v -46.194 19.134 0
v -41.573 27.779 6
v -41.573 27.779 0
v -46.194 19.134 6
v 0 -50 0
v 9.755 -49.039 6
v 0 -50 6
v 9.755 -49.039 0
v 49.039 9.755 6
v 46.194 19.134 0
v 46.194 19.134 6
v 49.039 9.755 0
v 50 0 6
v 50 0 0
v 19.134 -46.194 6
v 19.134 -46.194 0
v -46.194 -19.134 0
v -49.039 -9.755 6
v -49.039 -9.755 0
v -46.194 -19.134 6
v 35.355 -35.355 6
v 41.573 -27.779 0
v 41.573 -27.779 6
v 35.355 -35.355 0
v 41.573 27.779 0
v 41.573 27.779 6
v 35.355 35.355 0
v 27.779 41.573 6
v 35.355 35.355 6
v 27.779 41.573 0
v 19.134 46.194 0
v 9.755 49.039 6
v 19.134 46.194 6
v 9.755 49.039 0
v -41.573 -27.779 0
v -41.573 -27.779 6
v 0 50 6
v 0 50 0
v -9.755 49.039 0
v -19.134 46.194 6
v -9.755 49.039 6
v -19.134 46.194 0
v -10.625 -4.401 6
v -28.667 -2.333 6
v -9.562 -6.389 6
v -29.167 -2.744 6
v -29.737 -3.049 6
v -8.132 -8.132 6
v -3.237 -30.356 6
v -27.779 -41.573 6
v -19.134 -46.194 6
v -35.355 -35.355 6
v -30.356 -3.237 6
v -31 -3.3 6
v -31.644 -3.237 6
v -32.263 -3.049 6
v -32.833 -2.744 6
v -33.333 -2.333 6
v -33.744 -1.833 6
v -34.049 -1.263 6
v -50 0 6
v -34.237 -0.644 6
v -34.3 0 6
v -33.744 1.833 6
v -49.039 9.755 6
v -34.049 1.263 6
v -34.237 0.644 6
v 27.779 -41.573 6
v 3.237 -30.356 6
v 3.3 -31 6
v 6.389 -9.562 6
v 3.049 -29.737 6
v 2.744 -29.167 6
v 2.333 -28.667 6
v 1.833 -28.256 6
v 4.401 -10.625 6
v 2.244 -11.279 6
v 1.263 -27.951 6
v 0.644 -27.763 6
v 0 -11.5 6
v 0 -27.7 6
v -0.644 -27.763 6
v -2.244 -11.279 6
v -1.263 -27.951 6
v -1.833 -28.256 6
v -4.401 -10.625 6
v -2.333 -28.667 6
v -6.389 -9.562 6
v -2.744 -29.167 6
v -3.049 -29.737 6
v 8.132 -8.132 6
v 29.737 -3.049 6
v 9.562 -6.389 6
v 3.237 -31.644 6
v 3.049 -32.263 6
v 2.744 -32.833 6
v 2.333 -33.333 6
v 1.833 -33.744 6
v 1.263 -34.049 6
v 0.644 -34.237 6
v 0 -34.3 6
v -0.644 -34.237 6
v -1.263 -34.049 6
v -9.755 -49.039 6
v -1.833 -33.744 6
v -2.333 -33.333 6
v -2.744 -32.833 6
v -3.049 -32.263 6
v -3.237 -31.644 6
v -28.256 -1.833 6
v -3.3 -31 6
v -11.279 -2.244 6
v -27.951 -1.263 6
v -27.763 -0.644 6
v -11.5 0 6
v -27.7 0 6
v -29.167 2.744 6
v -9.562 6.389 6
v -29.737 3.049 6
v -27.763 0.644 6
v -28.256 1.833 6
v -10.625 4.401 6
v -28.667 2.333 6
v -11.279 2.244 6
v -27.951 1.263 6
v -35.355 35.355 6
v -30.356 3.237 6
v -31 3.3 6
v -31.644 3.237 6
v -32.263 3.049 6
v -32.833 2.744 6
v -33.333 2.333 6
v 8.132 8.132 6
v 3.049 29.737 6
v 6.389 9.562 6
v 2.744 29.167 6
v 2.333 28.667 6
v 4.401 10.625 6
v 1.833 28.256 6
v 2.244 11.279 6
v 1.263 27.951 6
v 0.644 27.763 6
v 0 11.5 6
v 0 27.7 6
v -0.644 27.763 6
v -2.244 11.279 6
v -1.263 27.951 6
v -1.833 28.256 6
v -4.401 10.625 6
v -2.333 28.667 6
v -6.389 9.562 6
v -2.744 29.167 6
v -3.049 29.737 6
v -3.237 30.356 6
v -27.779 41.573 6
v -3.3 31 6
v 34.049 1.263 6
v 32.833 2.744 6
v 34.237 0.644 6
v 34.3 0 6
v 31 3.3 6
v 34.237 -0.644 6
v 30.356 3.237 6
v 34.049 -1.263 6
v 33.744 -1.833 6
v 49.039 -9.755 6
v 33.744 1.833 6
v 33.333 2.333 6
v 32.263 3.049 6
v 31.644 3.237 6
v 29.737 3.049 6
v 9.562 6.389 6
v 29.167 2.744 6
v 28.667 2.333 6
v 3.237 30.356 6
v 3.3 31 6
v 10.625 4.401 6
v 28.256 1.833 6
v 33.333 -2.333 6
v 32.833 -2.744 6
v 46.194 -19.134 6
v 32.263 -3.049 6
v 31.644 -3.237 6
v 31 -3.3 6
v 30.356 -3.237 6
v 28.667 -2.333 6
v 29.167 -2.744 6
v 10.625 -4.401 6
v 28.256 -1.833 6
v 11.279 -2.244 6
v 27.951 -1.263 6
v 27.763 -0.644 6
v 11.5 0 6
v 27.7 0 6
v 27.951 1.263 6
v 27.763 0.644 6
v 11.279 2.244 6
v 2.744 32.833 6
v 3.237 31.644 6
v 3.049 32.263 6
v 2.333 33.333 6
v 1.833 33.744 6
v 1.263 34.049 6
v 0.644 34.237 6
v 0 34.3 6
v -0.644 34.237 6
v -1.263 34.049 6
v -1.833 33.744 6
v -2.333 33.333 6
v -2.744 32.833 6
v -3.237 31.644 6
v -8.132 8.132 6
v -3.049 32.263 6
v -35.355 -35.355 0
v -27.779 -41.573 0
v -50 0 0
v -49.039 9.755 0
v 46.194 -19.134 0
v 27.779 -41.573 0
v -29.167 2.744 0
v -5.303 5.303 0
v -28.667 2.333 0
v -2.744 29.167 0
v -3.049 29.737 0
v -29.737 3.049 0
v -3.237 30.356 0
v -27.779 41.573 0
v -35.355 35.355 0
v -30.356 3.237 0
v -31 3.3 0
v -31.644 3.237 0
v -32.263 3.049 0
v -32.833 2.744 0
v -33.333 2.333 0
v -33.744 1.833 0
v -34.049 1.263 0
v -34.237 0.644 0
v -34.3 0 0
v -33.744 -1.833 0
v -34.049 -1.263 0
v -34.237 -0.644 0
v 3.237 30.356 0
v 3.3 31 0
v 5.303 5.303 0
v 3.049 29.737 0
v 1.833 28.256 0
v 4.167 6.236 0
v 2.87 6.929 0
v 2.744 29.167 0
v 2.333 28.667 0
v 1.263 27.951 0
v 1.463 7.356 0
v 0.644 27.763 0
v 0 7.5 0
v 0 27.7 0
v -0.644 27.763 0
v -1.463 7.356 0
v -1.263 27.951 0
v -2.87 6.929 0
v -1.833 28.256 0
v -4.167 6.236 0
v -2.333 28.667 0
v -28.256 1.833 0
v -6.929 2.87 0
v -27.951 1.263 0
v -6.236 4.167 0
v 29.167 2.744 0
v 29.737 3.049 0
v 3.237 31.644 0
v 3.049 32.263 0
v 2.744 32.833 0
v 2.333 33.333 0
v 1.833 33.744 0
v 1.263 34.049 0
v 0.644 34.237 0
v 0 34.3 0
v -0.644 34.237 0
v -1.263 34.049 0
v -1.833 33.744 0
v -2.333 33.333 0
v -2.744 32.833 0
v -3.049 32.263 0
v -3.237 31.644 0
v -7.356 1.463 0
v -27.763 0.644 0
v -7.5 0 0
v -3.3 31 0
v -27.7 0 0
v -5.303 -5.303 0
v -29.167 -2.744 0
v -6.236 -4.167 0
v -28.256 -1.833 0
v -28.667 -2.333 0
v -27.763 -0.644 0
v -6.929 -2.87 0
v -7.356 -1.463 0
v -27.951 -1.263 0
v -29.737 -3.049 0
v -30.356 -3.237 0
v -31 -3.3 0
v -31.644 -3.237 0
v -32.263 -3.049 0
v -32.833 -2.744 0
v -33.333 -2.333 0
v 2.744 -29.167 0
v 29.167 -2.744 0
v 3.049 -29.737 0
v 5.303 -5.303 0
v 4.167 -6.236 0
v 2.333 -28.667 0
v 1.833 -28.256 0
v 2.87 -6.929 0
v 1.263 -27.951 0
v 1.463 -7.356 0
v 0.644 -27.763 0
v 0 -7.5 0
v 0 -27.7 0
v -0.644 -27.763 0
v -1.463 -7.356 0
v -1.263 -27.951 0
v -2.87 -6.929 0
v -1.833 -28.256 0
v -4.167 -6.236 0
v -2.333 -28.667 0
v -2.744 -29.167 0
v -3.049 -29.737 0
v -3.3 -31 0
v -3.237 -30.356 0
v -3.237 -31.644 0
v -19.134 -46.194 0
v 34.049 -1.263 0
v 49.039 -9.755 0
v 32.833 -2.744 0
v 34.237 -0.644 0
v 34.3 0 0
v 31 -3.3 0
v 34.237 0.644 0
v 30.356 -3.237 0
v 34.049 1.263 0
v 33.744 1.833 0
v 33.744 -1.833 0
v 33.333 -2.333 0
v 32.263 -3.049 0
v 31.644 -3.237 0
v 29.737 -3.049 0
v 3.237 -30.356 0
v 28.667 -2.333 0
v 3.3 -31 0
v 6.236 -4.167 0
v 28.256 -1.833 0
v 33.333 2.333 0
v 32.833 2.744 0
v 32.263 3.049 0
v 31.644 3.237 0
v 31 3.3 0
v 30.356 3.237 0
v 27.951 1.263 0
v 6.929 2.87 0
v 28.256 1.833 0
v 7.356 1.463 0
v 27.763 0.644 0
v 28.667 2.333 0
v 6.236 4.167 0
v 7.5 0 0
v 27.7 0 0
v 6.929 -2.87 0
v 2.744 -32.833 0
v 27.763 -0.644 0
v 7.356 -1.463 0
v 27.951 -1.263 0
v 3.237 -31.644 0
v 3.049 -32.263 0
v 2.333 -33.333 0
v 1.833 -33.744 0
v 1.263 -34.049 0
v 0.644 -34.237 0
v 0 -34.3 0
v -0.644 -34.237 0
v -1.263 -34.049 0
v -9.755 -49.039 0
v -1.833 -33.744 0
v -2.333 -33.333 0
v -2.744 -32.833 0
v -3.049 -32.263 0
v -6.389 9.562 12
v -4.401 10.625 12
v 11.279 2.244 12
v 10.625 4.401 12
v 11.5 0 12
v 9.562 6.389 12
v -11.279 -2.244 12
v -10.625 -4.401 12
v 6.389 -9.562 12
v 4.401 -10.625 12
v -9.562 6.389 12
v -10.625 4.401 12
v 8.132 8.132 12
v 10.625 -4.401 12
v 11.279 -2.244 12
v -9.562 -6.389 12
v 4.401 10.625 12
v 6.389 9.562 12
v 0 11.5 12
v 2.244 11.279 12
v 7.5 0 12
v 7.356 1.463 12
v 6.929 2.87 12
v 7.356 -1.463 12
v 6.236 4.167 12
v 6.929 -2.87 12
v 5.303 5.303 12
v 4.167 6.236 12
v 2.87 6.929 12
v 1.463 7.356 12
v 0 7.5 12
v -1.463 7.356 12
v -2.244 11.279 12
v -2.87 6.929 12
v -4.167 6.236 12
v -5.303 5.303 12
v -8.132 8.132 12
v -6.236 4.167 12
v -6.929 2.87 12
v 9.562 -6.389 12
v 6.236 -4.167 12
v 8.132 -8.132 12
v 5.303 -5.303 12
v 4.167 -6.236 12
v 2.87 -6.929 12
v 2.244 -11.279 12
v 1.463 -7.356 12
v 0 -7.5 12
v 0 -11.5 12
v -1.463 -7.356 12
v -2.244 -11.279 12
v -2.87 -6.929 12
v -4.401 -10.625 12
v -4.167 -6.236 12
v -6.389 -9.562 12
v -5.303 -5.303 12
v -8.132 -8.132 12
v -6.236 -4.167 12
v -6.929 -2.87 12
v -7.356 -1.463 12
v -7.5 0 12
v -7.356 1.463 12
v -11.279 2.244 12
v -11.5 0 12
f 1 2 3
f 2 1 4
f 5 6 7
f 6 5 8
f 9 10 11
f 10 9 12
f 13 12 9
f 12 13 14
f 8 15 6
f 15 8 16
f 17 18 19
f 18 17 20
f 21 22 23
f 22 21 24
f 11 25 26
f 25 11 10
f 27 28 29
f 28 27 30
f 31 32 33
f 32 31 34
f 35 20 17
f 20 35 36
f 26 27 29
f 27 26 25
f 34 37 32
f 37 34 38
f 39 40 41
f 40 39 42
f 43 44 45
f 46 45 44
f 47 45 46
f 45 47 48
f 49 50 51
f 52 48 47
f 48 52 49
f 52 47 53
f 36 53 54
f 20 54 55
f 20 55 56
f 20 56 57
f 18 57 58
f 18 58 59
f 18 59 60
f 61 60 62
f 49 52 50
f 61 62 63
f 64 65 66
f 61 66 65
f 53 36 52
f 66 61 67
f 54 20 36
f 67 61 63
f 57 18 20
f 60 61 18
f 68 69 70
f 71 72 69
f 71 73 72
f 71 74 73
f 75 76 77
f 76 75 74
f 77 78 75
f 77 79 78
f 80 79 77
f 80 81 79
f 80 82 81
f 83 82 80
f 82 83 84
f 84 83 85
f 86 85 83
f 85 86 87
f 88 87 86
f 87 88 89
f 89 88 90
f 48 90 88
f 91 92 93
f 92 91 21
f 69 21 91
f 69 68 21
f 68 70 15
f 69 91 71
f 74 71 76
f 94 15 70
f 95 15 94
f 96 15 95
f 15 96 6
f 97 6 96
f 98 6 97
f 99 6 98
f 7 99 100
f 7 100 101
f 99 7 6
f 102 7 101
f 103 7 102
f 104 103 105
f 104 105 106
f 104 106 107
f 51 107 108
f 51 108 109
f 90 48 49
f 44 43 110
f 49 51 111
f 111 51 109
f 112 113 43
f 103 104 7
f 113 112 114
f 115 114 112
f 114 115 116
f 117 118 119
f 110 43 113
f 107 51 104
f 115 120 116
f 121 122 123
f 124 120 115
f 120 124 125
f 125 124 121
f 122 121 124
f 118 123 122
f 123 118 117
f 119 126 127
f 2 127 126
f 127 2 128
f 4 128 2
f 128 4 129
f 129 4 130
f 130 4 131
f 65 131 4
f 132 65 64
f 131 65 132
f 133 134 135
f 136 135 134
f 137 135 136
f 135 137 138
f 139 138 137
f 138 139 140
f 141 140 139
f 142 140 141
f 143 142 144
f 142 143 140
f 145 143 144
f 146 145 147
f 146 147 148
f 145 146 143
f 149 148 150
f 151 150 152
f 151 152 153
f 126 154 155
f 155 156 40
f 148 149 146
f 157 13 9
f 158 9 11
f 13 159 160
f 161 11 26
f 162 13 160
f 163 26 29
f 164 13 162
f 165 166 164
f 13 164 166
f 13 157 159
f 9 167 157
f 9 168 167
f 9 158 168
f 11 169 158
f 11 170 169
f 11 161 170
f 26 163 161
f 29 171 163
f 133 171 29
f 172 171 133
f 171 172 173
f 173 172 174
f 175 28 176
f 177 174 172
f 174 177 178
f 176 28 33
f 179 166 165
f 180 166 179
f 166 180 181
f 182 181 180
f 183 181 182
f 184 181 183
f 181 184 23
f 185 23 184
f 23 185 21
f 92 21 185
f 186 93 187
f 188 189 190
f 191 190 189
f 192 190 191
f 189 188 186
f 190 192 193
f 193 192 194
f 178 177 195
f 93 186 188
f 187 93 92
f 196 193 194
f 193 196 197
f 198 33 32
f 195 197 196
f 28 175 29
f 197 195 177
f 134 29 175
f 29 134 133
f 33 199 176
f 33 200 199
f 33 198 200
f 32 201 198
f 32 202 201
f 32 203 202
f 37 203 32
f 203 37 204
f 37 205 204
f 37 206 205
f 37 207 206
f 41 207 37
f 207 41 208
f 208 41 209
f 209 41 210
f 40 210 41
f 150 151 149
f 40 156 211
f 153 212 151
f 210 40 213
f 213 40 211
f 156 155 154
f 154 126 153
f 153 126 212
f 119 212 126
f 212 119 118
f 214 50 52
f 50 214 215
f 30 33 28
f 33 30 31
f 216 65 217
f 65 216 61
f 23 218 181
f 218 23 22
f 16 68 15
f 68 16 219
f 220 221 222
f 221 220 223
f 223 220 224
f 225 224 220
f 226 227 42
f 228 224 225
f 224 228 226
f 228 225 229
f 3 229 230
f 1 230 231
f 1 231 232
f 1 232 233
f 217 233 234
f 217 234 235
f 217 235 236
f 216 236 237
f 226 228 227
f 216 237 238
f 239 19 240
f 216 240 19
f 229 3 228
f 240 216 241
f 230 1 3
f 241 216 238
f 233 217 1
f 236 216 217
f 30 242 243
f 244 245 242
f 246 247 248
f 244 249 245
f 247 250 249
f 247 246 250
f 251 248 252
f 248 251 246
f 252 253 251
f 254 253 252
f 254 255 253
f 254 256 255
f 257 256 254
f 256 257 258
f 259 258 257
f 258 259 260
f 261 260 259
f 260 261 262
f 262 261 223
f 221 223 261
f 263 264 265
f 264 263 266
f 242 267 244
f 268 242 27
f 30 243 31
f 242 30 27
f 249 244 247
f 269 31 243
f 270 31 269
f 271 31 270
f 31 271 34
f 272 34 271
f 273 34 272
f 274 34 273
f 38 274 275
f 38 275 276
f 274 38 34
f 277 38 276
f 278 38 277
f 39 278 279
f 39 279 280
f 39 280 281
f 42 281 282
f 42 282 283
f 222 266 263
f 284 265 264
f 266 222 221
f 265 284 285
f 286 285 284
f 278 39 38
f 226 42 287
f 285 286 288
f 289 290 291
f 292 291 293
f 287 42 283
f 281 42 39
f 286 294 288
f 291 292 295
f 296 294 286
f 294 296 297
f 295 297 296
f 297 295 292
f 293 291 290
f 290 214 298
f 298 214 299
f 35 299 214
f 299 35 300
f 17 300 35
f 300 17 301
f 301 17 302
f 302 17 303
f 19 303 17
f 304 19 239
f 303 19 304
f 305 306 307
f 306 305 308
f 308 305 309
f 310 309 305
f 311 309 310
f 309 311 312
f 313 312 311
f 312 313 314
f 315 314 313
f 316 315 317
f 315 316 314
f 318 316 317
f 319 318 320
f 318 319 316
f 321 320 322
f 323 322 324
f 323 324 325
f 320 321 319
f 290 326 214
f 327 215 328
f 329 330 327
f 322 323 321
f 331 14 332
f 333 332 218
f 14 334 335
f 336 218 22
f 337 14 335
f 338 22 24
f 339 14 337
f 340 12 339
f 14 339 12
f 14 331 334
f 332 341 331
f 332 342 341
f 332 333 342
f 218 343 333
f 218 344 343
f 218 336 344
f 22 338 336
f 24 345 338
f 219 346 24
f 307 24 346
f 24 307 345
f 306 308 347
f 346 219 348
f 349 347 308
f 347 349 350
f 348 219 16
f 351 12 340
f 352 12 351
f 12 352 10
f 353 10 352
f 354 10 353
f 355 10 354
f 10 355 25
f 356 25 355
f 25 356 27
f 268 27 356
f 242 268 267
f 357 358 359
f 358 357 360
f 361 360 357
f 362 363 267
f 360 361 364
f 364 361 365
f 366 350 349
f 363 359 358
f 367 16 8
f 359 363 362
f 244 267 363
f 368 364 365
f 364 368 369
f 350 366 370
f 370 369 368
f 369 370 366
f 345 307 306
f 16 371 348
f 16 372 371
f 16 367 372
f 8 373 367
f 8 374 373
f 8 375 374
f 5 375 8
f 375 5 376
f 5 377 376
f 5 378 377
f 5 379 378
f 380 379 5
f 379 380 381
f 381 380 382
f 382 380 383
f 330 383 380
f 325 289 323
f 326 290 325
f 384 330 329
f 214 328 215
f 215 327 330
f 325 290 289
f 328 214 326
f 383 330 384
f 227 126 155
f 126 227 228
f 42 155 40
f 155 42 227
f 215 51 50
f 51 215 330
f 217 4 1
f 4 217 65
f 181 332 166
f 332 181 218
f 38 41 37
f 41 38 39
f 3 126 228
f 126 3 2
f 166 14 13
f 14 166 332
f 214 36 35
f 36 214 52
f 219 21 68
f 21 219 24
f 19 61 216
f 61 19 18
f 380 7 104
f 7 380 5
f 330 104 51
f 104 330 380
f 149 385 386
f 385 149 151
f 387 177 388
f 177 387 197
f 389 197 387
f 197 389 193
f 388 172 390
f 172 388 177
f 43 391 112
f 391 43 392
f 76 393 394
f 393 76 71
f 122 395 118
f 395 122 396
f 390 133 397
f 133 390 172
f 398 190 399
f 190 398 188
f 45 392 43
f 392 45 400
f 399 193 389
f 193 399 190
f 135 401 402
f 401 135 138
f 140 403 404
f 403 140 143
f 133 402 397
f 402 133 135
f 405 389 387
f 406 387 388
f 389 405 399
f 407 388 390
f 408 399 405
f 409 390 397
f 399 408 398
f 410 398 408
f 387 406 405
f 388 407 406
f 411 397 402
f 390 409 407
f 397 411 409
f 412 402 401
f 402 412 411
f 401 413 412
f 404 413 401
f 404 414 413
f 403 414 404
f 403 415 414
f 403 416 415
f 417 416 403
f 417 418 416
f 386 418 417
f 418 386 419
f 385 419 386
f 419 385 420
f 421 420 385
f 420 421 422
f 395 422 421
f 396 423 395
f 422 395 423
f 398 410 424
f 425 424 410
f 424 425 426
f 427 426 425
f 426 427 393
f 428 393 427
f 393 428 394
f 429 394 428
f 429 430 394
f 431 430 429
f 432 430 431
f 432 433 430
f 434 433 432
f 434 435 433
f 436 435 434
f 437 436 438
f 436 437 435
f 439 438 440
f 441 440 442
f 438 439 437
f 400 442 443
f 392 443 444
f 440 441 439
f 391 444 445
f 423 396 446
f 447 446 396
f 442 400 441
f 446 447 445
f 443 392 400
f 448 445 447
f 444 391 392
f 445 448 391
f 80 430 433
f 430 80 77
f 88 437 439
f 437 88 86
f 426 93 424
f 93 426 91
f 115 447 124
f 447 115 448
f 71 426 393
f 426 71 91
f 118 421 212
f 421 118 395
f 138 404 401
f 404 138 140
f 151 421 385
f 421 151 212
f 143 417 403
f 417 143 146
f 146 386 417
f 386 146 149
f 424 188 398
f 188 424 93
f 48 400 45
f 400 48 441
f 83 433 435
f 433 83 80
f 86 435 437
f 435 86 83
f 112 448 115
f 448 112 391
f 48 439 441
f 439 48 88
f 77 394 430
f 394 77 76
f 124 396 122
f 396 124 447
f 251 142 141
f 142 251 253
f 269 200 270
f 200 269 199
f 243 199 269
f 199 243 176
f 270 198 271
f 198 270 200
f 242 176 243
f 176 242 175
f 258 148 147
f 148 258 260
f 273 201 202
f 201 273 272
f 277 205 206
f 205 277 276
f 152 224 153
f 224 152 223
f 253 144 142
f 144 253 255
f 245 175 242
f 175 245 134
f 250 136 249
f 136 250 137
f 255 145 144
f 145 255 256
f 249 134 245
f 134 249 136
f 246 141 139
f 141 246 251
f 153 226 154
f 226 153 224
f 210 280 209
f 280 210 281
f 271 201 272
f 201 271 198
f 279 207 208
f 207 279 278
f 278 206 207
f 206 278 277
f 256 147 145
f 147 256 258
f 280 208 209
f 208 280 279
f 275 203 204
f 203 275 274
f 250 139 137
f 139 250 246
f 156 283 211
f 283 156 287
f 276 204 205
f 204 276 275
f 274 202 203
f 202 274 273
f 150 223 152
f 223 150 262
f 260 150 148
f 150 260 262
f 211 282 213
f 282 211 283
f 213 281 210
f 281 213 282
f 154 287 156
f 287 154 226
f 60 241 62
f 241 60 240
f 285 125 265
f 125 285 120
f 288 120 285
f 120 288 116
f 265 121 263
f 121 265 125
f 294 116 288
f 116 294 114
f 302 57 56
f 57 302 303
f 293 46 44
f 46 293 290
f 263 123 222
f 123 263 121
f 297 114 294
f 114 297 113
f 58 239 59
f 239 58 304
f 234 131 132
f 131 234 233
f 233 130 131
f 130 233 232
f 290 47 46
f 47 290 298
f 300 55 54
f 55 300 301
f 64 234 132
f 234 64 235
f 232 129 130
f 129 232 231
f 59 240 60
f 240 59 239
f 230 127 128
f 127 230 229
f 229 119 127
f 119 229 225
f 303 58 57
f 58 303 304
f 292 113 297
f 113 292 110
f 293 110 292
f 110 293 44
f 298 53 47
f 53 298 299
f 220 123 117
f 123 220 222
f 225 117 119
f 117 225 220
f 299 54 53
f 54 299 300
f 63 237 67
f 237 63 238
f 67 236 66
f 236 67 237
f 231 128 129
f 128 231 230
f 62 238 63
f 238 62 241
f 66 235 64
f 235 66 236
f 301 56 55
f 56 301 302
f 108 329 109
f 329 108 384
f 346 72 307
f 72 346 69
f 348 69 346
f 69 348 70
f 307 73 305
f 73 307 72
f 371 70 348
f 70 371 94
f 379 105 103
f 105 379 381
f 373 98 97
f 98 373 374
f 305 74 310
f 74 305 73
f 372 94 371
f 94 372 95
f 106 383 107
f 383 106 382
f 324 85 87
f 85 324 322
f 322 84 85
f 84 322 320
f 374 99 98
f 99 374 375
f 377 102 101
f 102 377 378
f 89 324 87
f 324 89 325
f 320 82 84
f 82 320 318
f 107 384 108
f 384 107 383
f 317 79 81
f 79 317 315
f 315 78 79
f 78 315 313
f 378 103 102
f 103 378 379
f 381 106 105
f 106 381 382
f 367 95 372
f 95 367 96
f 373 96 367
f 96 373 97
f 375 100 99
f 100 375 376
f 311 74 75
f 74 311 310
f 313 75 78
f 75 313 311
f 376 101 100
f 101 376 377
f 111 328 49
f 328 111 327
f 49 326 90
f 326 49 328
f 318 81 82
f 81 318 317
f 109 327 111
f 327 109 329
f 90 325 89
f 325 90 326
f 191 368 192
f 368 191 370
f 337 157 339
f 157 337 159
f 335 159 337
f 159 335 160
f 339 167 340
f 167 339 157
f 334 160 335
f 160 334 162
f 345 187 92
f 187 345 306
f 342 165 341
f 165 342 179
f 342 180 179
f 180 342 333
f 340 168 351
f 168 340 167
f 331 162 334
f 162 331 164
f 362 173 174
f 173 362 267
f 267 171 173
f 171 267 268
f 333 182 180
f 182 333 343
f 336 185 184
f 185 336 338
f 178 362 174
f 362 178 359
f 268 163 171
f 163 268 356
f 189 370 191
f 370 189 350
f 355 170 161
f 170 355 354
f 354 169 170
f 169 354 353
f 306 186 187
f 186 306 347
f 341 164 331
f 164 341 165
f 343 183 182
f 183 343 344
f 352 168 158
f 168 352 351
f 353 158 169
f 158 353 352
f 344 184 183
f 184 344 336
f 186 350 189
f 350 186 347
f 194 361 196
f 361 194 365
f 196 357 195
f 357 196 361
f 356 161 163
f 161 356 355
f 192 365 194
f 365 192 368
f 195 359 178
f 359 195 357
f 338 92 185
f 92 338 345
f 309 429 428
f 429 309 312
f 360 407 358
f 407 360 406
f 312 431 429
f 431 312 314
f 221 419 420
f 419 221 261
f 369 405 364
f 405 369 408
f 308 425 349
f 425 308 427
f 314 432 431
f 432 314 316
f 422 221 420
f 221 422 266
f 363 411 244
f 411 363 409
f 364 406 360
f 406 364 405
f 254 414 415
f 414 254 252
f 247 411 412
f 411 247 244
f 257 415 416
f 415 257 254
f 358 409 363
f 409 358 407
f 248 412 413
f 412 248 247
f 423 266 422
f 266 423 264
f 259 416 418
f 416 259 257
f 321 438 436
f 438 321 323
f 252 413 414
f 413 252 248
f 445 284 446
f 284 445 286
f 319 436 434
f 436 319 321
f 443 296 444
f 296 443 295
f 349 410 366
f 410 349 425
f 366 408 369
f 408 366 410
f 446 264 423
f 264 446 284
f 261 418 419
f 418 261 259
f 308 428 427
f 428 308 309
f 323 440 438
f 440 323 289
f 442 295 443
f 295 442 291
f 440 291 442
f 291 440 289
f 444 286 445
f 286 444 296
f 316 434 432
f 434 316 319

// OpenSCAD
$fn = 32;

// ----------------------------------------------------------------------
// Flange Ø100 x 6
// 4 holes on a Ø62 bolt circle, bolted joints
// ----------------------------------------------------------------------

// --- parameters (mm) ---
flange_d = 100;  // outside diameter of the flange
thickness = 6;   // flange thickness
holes = 4;       // number of bolt holes
pcd = 62;        // bolt circle diameter
start_deg = 90;  // angle of the first hole, from +X
hole_d = 6.6;    // bolt hole diameter
bore_d = 15;     // central through bore
hub_d = 23;      // hub outside diameter
hub_h = 6;       // hub height above the flange face (0 = no hub)

// --- derived feature positions (mm) ---
height = thickness + hub_h;  // = 12   overall height of the part
pcd_r = pcd / 2;             // = 31   bolt circle radius
hole_step = 360 / holes;     // = 90   angular pitch
feature_centers = [
  [pcd_r * cos(start_deg + 0 * hole_step), pcd_r * sin(start_deg + 0 * hole_step)],
  [pcd_r * cos(start_deg + 1 * hole_step), pcd_r * sin(start_deg + 1 * hole_step)],
  [pcd_r * cos(start_deg + 2 * hole_step), pcd_r * sin(start_deg + 2 * hole_step)],
  [pcd_r * cos(start_deg + 3 * hole_step), pcd_r * sin(start_deg + 3 * hole_step)]
];   // bolt hole centres on the pitch circle

// flange disc, every hole and the bore cut straight through
difference() {
  union() {
    cylinder(d = flange_d, h = thickness);
    cylinder(d = hub_d, h = height);  // hub, overlapped into the flange
  }
  translate([0, 0, -1]) cylinder(d = bore_d, h = height + 2);  // bore, through
  for (centre = feature_centers)
    translate([centre[0], centre[1], -1]) cylinder(d = hole_d, h = thickness + 2);
}
